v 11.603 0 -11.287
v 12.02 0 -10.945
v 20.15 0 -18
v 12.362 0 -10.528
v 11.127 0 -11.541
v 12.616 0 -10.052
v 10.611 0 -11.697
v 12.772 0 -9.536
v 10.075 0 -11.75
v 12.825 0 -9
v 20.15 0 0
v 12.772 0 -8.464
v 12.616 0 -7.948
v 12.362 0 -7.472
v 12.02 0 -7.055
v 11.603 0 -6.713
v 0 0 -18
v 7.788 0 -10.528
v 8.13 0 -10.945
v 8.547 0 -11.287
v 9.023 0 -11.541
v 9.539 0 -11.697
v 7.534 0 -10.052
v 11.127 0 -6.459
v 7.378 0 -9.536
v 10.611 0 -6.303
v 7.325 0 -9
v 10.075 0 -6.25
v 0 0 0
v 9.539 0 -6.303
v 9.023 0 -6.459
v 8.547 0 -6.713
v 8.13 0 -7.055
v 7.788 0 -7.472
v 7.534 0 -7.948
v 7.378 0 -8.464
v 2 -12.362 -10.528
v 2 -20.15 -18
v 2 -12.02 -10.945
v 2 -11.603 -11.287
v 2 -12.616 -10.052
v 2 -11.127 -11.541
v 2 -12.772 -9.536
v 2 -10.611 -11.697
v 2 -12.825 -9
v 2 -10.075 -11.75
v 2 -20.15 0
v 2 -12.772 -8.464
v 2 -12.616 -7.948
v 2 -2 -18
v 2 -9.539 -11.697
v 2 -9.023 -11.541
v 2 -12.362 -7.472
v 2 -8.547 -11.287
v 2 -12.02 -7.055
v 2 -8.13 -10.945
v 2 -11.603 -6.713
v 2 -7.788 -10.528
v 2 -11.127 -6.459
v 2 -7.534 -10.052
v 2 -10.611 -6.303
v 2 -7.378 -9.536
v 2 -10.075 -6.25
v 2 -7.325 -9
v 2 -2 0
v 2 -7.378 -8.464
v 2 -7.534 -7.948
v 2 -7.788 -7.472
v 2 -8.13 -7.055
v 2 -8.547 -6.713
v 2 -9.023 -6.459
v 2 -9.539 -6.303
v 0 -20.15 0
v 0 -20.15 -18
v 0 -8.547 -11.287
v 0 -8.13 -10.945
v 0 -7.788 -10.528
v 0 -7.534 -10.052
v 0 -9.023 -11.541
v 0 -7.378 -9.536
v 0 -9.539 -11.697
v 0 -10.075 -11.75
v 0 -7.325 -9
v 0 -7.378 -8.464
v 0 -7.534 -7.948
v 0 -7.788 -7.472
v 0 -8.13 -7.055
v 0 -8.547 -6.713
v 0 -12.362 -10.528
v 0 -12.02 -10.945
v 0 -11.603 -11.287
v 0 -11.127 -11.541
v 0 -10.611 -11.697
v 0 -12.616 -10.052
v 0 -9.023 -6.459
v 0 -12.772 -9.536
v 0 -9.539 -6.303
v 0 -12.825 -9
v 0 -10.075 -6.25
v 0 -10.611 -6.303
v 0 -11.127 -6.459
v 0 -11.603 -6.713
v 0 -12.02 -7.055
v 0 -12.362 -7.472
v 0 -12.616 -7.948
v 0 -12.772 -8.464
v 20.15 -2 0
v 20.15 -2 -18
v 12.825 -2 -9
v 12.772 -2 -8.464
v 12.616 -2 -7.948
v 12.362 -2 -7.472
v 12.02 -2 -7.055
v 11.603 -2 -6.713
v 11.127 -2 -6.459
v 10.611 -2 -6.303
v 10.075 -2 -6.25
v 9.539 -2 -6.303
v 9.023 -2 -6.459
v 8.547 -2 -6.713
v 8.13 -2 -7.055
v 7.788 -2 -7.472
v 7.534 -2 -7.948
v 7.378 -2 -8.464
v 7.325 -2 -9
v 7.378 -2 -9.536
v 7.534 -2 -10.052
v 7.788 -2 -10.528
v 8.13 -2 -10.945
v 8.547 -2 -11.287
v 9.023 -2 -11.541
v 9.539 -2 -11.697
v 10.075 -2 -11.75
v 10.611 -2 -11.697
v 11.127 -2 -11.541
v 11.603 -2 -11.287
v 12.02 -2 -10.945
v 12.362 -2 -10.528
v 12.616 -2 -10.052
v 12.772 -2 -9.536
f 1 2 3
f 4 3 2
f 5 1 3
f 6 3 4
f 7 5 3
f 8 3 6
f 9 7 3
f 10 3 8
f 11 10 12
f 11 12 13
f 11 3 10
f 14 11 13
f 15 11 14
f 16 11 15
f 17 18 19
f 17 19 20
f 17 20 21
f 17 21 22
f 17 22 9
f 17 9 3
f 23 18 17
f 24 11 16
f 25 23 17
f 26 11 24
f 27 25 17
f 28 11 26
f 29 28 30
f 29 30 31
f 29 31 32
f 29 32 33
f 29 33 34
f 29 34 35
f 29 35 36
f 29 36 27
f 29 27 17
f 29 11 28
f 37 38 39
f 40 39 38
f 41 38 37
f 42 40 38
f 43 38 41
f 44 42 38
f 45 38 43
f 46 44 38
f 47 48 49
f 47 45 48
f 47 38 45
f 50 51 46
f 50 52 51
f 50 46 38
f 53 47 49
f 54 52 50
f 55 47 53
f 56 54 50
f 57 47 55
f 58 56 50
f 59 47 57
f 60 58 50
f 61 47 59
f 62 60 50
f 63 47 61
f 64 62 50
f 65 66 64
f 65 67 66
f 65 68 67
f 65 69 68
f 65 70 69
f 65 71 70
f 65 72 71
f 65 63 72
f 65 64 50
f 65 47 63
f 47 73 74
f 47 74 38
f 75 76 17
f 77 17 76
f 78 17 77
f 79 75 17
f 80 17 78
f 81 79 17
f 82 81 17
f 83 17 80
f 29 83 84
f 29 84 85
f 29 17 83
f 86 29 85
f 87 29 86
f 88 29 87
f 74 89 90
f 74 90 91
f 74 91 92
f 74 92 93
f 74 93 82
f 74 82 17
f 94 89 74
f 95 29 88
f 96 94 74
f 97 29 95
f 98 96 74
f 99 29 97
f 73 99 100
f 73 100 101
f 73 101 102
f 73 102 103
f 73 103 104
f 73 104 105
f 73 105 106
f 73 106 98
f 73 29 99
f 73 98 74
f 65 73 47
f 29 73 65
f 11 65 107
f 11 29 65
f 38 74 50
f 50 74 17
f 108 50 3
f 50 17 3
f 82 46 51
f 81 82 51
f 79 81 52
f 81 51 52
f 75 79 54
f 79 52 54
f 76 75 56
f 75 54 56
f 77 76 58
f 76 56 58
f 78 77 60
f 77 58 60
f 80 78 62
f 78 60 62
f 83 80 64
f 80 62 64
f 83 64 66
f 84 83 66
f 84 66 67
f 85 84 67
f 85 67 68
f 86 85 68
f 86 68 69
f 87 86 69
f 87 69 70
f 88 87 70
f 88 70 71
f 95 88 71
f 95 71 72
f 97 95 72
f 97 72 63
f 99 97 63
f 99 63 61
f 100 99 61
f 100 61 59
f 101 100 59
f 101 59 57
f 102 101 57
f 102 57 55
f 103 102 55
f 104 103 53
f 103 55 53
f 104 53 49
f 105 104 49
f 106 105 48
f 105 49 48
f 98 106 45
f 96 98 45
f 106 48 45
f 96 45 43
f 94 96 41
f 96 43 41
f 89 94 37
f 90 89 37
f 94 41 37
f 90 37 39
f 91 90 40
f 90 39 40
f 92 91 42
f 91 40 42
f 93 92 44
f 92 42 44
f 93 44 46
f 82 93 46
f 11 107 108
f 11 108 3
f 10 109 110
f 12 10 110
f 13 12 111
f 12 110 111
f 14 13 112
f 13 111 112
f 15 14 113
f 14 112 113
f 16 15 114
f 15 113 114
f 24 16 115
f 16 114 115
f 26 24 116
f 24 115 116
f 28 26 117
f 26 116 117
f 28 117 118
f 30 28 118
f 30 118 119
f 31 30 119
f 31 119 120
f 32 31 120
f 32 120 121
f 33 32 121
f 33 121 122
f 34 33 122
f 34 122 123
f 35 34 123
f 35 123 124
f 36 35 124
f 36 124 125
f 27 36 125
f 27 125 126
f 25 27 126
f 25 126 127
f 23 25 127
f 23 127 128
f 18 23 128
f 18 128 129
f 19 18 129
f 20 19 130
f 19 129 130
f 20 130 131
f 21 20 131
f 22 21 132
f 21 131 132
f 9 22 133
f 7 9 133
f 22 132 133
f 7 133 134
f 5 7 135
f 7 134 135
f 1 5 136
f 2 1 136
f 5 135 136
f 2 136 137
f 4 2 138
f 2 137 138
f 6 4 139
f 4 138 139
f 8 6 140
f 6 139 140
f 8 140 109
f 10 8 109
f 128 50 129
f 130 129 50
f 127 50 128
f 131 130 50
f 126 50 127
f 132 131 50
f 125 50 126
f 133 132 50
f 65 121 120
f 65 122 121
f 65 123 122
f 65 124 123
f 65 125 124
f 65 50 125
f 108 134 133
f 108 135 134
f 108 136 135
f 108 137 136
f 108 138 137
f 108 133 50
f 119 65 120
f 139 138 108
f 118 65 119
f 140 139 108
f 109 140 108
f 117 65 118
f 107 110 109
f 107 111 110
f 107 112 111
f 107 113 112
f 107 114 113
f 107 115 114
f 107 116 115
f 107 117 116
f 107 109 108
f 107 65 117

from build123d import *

# Parameters (mm, degrees)
BOSS_EXTRUDE1_DEPTH = 18
SKETCH2_R           = 2.75
CUT_EXTRUDE1_DEPTH  = 18
SKETCH3_R           = 2.75
CUT_EXTRUDE2_DEPTH  = 18


with BuildPart() as part:
    # Sketch1 → Boss-Extrude1 (new body)
    with BuildSketch(Plane.XY):
        Polygon((0, 0), (0, -20.15), (2, -20.15), (2, -2), (20.15, -2), (20.15, 0), align=None)
    extrude(amount=-BOSS_EXTRUDE1_DEPTH)

    # Sketch2 → Cut-Extrude1 (cut)
    with BuildSketch(Plane.XZ.offset(2)):
        with Locations((10.075, -9)):
            Circle(SKETCH2_R)
    extrude(amount=-CUT_EXTRUDE1_DEPTH, mode=Mode.SUBTRACT)

    # Sketch3 → Cut-Extrude2 (cut)
    with BuildSketch(Plane(origin=(2, 0, 0), x_dir=(0, 0, -1), z_dir=(1, 0, 0))):
        with Locations((9, -10.075)):
            Circle(SKETCH3_R)
    extrude(amount=-CUT_EXTRUDE2_DEPTH, mode=Mode.SUBTRACT)


solid = part.part
